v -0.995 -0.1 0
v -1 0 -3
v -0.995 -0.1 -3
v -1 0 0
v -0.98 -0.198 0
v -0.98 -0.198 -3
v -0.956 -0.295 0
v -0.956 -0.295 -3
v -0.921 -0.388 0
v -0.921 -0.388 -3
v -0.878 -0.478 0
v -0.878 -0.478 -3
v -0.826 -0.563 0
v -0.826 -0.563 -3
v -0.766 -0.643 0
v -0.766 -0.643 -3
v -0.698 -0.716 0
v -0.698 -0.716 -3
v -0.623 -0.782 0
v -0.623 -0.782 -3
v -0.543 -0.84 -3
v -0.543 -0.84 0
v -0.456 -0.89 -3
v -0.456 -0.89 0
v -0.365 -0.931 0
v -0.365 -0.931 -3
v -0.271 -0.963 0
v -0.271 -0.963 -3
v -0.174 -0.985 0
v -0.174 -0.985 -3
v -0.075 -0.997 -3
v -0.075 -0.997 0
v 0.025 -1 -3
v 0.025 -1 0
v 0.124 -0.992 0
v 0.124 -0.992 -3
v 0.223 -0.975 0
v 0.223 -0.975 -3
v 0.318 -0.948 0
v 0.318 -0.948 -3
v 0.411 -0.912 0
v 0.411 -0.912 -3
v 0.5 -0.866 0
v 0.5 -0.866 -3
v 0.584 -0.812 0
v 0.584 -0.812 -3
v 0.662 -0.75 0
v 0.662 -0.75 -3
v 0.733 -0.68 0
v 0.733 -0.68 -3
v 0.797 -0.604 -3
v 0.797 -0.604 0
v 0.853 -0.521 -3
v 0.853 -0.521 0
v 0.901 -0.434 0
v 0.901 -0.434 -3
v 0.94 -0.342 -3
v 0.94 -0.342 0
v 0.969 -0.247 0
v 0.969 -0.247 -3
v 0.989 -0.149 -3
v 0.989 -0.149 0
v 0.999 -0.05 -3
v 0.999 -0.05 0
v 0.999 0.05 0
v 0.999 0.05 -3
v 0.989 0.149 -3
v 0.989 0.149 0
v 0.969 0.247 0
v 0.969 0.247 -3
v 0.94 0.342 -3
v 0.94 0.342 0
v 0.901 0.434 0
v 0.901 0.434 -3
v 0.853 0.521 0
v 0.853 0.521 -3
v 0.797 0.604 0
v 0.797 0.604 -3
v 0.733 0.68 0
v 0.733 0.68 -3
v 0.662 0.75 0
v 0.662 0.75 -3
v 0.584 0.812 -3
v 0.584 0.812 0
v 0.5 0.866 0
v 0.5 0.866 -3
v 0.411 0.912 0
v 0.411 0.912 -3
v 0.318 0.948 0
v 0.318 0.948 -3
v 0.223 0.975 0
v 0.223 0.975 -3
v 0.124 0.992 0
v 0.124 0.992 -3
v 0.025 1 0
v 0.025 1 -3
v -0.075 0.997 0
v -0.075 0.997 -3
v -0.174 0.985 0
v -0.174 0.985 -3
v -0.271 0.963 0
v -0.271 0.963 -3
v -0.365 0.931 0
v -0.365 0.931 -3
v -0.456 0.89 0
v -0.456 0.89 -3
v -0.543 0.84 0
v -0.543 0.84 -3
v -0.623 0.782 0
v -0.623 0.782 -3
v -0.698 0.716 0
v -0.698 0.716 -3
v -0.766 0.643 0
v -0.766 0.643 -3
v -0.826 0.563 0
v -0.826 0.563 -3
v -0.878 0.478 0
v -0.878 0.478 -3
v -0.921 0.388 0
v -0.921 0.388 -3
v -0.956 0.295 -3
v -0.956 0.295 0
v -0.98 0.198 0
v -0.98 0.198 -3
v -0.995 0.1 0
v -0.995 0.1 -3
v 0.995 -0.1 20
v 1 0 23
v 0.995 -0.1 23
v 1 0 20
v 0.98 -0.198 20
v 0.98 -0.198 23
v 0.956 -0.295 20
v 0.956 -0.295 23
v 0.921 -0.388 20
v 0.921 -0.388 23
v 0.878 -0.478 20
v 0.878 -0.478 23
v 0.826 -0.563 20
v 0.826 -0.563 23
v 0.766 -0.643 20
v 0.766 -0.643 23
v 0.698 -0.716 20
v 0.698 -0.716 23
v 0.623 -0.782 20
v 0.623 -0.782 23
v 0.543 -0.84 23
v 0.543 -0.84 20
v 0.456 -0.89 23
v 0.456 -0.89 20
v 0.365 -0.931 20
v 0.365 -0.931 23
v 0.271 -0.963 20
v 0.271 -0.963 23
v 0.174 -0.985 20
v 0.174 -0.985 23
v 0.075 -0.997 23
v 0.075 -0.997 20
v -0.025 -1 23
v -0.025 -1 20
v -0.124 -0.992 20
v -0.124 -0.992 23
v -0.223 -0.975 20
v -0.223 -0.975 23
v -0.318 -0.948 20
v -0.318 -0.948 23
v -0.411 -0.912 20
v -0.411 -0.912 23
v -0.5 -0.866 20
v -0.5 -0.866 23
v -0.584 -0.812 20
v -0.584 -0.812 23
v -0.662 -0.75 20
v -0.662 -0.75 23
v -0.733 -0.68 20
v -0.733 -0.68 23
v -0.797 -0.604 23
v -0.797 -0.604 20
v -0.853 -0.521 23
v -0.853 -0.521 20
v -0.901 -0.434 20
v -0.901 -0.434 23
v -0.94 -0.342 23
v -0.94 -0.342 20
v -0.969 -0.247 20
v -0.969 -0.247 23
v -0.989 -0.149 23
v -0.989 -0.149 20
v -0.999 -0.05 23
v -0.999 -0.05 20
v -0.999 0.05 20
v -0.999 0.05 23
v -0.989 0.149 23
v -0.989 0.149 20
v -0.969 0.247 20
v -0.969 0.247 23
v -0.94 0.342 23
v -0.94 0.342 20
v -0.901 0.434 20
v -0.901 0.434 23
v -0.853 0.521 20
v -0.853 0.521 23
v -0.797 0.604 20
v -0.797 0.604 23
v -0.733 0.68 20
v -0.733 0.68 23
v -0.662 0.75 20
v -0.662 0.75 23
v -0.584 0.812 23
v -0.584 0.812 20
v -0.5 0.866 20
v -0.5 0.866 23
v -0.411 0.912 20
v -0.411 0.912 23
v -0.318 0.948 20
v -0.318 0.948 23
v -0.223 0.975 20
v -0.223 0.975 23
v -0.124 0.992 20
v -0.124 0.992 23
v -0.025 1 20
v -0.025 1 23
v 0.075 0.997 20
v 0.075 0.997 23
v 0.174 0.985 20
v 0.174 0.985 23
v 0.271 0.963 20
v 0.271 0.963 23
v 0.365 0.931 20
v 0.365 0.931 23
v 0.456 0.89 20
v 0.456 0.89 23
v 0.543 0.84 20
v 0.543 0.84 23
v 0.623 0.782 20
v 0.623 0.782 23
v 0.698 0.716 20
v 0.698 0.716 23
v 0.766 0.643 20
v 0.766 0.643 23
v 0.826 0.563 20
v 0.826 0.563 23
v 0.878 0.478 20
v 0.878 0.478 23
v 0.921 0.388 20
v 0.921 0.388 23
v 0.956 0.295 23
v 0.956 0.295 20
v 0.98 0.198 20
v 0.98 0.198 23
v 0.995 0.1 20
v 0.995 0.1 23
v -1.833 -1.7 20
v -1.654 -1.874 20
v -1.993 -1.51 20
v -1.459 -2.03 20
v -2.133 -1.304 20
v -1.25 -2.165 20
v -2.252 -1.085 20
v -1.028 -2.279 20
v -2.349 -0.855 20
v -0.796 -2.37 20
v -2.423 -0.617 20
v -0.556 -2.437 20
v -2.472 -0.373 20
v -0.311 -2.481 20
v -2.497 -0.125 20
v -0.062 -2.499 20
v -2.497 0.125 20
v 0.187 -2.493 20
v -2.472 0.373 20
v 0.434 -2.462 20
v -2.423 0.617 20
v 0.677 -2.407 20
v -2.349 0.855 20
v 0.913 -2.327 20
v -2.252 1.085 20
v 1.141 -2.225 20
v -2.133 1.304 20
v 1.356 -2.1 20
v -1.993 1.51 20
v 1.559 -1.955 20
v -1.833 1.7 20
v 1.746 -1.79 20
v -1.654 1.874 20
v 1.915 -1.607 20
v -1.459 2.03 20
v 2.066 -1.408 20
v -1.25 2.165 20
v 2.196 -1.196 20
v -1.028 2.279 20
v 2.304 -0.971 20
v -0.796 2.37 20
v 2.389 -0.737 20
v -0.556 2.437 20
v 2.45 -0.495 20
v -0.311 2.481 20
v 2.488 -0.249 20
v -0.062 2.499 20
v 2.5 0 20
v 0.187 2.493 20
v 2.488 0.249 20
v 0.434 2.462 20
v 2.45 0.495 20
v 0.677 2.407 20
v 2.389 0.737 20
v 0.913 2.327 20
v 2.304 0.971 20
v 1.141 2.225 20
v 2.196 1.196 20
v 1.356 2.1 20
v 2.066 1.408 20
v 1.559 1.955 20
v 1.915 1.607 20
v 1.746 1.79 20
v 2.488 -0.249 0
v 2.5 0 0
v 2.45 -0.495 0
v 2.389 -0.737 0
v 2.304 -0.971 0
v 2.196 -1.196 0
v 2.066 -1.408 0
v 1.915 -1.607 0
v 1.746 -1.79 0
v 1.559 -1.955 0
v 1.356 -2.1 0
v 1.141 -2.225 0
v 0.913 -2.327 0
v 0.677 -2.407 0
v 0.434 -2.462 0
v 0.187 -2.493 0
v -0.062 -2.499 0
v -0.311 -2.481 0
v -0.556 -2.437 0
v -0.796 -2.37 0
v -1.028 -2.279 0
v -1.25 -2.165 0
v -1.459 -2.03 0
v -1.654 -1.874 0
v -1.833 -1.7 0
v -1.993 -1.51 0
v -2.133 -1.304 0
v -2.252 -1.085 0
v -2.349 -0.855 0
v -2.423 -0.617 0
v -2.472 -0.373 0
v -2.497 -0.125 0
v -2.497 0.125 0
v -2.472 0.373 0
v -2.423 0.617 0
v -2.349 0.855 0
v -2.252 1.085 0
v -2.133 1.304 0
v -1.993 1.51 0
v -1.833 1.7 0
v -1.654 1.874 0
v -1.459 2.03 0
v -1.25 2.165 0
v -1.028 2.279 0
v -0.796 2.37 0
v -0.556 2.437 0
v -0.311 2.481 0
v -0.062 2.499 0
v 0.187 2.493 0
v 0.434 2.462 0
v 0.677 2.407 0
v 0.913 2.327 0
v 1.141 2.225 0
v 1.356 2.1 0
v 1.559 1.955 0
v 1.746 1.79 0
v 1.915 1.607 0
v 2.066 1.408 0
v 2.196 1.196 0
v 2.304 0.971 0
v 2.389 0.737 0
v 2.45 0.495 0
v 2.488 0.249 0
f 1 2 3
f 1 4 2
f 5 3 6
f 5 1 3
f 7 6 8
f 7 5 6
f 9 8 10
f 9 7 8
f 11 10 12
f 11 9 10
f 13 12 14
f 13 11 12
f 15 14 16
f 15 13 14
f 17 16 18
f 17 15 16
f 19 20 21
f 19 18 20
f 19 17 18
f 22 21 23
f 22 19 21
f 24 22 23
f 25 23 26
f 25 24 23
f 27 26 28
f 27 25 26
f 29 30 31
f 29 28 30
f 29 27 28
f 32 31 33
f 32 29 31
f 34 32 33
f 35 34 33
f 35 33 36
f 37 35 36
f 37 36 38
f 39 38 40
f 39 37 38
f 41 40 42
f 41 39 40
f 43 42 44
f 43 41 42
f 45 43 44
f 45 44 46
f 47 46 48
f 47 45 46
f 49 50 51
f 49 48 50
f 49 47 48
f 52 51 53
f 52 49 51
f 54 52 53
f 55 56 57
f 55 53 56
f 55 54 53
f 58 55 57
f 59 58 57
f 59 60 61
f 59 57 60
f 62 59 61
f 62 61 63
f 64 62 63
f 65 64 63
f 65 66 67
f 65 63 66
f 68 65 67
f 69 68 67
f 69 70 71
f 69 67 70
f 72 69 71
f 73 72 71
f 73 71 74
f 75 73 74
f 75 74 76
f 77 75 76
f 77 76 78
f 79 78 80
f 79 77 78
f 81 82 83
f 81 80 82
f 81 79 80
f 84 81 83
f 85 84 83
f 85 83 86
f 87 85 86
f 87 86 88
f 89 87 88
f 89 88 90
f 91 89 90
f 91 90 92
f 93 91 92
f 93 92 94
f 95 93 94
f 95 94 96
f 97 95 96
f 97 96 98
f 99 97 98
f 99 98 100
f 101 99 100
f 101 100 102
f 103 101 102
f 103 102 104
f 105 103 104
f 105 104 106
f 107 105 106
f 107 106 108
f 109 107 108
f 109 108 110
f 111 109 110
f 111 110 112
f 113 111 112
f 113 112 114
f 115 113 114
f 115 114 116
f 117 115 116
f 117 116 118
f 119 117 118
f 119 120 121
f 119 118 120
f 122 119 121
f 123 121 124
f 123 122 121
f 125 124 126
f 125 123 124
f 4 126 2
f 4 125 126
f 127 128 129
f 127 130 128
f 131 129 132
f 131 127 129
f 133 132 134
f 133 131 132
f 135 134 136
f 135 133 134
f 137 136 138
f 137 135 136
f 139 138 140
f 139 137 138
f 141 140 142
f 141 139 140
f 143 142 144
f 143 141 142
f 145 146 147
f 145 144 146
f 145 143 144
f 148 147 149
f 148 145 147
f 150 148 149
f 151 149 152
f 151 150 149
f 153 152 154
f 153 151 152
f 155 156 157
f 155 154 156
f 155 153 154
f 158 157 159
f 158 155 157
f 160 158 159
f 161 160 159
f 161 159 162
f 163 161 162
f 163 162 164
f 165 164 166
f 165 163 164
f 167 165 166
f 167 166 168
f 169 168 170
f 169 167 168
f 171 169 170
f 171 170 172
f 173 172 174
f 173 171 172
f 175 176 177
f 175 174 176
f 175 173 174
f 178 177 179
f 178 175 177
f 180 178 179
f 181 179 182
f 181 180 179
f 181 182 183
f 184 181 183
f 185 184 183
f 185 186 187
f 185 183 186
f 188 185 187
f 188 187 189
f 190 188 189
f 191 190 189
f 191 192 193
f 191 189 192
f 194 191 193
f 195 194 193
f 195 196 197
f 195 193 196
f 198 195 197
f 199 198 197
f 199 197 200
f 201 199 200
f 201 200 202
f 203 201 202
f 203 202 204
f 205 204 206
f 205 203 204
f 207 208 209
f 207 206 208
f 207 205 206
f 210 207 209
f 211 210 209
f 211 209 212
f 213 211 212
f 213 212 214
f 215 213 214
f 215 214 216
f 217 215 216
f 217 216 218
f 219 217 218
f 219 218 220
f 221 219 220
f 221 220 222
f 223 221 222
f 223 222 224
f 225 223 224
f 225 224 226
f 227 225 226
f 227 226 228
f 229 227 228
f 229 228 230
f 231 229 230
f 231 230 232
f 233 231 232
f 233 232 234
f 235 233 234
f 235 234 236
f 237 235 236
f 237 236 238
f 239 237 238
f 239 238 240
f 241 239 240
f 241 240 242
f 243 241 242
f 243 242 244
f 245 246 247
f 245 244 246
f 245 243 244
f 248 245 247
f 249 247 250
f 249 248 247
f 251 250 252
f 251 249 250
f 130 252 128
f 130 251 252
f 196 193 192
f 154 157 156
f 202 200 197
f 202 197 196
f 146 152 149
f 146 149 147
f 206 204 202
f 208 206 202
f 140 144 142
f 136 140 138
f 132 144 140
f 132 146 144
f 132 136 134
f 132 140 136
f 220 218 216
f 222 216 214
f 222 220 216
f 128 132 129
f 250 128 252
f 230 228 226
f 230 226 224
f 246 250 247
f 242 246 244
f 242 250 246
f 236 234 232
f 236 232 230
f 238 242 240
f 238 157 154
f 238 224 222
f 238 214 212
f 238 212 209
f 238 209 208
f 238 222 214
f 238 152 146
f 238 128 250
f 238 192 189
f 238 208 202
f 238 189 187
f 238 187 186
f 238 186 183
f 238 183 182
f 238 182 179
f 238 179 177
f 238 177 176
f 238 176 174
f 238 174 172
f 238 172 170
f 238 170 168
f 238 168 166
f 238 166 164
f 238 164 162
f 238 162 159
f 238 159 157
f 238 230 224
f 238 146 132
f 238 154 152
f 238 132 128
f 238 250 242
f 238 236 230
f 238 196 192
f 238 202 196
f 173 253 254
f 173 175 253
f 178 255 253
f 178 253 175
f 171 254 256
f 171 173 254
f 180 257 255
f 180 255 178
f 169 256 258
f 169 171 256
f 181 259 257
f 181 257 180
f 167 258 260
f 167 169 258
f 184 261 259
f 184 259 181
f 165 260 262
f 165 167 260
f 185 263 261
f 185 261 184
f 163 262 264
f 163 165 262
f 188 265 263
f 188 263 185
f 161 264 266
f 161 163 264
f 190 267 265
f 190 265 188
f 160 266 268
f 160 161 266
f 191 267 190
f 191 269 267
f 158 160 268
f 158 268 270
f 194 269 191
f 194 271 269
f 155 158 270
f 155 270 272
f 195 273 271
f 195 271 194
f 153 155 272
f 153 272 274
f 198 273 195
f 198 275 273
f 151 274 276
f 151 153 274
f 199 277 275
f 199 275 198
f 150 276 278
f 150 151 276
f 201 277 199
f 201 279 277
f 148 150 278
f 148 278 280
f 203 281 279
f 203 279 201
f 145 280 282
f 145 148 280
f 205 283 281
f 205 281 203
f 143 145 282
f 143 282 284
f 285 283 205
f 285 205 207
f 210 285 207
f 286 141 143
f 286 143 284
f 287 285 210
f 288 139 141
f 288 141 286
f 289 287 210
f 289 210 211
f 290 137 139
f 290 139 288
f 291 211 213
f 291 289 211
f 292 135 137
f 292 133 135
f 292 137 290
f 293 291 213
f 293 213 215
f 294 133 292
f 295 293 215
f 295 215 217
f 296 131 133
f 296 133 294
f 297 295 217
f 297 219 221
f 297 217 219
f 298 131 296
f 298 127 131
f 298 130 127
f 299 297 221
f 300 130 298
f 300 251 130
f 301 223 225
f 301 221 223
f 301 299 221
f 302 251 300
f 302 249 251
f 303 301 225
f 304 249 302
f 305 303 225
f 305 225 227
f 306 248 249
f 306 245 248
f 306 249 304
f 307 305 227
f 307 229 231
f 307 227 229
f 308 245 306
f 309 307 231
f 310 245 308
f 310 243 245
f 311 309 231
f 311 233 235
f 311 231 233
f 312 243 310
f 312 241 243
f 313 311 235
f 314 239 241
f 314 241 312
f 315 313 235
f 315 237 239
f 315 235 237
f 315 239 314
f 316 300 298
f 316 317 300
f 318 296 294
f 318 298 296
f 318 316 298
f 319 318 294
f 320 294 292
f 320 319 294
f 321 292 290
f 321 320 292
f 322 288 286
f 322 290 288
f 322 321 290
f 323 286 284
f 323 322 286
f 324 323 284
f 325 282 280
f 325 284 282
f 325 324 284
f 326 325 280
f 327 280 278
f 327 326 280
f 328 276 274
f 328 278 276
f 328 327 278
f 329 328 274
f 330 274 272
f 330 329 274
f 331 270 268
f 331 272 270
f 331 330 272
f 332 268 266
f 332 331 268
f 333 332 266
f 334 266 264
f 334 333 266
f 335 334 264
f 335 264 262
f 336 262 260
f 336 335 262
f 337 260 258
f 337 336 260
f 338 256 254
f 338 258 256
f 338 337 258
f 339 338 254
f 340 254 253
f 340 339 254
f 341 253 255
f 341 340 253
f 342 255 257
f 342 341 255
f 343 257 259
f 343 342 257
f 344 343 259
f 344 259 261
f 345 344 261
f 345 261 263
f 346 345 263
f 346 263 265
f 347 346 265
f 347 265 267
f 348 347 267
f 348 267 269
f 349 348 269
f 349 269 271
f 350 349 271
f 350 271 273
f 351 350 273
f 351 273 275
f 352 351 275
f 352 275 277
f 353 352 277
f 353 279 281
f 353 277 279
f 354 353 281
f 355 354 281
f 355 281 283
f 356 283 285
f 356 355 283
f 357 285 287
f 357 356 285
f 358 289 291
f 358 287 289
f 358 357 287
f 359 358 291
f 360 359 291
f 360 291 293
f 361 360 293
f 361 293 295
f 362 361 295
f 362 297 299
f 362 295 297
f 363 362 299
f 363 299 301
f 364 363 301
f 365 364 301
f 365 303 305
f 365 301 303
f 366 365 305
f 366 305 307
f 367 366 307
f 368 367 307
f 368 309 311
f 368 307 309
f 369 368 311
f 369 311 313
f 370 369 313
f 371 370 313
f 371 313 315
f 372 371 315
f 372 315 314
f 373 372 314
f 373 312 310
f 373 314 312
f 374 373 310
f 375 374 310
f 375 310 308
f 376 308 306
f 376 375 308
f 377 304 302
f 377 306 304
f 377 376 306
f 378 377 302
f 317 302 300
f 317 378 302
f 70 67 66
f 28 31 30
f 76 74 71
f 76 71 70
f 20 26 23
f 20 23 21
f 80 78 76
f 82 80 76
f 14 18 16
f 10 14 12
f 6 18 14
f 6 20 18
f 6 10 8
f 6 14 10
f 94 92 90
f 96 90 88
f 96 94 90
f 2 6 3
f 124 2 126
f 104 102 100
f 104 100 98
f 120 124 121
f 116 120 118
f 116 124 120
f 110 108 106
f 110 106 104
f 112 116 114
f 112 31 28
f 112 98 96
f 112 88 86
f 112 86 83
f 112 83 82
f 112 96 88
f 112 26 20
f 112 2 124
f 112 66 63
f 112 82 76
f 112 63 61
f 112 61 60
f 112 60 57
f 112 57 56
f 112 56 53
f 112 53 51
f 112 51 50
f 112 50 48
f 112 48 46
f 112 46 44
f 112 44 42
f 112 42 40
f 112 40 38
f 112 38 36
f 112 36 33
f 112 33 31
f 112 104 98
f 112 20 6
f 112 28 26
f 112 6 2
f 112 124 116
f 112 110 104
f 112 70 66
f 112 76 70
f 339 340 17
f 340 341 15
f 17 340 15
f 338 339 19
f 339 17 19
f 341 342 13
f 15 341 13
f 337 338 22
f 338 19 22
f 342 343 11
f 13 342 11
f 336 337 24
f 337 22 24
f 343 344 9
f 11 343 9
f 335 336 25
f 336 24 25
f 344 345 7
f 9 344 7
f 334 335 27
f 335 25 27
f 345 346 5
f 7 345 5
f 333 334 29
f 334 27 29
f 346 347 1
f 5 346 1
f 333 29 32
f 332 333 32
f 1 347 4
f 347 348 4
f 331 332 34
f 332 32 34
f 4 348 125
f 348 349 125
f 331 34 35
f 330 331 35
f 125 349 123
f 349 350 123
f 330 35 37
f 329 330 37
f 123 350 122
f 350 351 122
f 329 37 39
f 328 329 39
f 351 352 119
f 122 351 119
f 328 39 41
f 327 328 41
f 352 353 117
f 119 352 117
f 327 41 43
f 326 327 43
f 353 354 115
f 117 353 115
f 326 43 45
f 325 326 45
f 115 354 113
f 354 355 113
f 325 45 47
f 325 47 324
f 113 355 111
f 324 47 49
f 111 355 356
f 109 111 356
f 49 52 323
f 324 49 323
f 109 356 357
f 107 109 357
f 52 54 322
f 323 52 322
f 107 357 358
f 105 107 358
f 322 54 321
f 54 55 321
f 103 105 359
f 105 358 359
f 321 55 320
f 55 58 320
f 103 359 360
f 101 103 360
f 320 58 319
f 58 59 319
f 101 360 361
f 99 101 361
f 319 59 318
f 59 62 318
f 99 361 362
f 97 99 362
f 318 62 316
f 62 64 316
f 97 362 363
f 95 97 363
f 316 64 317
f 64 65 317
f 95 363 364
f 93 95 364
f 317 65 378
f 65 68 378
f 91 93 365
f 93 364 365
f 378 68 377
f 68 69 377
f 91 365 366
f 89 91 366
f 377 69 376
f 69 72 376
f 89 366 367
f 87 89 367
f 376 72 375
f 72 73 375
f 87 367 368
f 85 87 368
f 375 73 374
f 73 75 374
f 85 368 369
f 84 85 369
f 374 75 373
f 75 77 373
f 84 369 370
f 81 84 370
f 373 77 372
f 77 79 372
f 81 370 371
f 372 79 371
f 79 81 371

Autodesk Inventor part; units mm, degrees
ref_plane "YZ Plane" through (0, 0, 0) normal (1, 0, 0) x (0, 1, 0)
ref_plane "XZ Plane" through (0, 0, 0) normal (0, 1, 0) x (-1, 0, 0)
ref_plane "XY Plane" through (0, 0, 0) normal (0, 0, 1) x (1, 0, 0)
sketch "Sketch1" plane through (0, 0, 0) normal (0, 0, 1) x (1, 0, 0)
  circle A0 centre (0, 0) radius 2.5
  dimension "d0" = 5
extrude "Extrusion1" add sketch "Sketch1" along normal blind 20
sketch "Sketch2" plane through (0, 0, 20) normal (0, 0, 1) x (1, 0, 0)
  circle A0 centre (0, 0) radius 2.5 projected
  circle A1 centre (0, 0) radius 1
  dimension "d3" = 2
extrude "Extrusion2" add sketch "Sketch2" along normal blind 3 contours A1
sketch "Sketch3" plane through (0, 0, 0) normal (0, 0, -1) x (-1, 0, 0)
  circle A0 centre (0, 0) radius 1
  dimension "d6" = 2
extrude "Extrusion3" add sketch "Sketch3" along normal blind 3
properties part number "Bone-2cm"
